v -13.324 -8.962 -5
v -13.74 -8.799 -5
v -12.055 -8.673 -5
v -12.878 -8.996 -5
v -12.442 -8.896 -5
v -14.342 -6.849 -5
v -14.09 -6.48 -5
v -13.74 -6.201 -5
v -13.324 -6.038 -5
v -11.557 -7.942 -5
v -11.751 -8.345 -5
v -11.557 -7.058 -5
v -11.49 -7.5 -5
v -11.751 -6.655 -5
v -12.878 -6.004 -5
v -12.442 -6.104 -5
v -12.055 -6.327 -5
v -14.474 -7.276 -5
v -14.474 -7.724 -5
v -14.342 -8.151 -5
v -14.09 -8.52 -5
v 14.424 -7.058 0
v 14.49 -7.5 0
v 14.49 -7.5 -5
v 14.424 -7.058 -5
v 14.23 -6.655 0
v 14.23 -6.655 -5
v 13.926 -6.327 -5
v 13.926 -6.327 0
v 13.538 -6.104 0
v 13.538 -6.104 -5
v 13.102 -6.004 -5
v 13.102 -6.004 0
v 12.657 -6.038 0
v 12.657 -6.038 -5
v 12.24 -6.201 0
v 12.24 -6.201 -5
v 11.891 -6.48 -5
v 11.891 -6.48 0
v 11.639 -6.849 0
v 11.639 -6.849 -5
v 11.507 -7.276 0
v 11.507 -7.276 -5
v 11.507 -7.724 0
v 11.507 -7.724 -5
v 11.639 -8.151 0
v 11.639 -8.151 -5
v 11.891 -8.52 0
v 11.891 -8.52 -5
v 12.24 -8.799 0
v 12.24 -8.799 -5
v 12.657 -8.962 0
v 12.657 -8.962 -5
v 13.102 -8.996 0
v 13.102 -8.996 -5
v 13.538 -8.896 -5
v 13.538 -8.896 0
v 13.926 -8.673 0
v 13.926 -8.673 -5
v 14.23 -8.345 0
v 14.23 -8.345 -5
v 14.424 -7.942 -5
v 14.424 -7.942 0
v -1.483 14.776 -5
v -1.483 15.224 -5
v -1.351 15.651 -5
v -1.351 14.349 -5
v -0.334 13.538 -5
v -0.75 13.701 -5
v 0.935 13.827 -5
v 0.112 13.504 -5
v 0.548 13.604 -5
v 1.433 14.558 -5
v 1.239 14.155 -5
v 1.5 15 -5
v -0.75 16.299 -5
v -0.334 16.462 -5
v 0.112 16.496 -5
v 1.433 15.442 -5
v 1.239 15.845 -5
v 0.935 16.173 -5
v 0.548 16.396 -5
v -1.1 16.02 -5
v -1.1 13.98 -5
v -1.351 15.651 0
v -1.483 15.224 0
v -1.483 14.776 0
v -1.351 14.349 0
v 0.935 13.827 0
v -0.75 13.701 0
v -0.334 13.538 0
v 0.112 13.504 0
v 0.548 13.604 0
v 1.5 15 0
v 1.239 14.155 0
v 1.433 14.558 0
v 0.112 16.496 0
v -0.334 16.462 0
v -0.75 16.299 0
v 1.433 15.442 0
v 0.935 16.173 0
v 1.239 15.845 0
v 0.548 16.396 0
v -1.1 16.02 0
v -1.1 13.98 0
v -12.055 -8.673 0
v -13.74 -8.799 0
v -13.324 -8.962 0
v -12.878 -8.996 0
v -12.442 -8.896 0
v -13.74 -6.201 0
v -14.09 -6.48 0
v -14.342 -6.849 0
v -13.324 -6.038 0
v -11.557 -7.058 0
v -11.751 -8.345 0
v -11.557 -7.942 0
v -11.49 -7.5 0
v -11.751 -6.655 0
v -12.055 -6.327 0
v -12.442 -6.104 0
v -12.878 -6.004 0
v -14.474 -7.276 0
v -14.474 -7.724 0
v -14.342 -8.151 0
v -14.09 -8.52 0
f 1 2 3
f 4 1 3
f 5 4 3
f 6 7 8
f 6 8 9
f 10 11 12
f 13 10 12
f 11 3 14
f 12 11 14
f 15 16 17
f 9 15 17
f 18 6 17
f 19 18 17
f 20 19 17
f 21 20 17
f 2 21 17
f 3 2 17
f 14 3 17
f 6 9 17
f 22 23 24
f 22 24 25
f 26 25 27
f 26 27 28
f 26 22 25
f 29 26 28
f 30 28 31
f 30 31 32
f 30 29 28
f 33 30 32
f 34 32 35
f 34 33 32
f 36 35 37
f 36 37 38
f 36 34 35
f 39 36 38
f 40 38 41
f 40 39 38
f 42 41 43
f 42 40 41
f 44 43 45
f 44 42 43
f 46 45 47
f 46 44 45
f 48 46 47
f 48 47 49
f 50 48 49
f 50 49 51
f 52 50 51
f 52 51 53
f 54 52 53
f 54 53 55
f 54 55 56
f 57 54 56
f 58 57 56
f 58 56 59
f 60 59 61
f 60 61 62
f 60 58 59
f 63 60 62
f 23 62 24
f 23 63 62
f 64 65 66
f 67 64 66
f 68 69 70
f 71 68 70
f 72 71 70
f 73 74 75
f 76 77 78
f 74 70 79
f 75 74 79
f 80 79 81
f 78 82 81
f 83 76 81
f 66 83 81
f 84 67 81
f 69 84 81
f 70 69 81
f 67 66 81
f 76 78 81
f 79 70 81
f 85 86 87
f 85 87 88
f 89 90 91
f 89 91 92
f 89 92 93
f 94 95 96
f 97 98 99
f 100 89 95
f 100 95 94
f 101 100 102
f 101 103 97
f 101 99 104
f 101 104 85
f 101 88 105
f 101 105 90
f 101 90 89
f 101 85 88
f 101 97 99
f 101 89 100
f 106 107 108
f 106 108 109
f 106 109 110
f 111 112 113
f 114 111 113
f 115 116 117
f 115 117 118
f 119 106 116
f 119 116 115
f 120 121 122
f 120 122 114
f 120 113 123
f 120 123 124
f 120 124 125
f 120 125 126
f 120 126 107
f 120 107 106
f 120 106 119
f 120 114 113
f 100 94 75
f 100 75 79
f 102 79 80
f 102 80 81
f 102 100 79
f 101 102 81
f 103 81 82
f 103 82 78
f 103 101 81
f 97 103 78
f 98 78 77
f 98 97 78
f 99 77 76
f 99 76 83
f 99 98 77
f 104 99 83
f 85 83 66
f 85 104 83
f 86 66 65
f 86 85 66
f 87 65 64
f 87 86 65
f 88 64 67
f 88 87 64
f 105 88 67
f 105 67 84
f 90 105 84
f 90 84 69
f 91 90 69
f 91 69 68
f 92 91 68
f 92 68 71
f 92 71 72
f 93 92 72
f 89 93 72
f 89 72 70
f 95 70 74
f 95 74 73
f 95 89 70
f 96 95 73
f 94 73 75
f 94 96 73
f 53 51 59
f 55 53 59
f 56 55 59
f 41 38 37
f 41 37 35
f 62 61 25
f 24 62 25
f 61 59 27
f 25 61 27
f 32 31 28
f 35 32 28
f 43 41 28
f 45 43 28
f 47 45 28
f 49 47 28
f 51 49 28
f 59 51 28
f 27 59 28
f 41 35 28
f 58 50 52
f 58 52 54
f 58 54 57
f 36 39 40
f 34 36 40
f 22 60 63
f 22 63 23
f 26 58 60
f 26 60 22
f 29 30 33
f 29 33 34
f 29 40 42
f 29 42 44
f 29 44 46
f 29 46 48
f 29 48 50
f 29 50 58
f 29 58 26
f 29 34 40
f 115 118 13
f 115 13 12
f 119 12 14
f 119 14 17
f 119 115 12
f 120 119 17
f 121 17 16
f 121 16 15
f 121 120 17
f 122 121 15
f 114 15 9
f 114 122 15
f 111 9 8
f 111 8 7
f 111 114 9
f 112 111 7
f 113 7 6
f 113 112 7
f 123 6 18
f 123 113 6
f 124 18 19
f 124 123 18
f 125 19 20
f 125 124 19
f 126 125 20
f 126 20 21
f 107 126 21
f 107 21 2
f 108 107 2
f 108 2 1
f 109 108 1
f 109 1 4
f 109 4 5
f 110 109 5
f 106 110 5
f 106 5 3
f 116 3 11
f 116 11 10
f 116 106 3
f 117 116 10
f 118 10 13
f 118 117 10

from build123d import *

# Parameters (mm, degrees)
SKIZZE1_R                         = 1.5
AUFSATZ_LINEAR_AUSTRAGEN1_DEPTH   = 5
AUFSATZ_LINEAR_AUSTRAGEN1_2_DEPTH = 5
AUFSATZ_LINEAR_AUSTRAGEN1_3_DEPTH = 5


with BuildPart() as part:
    # Skizze1 → Aufsatz-Linear austragen1 (new body)
    with BuildSketch(Plane.XY):
        with Locations((0, 15)):
            Circle(SKIZZE1_R)
    extrude(amount=-AUFSATZ_LINEAR_AUSTRAGEN1_DEPTH)


with BuildPart() as body_2:
    # Skizze1 → Aufsatz-Linear austragen1 2 (new body)
    with BuildSketch(Plane.XY):
        with Locations((12.990381057, -7.5)):
            Circle(SKIZZE1_R)
    extrude(amount=-AUFSATZ_LINEAR_AUSTRAGEN1_2_DEPTH)


with BuildPart() as body_3:
    # Skizze1 → Aufsatz-Linear austragen1 3 (new body)
    with BuildSketch(Plane.XY):
        with Locations((-12.990381057, -7.5)):
            Circle(SKIZZE1_R)
    extrude(amount=-AUFSATZ_LINEAR_AUSTRAGEN1_3_DEPTH)


solid = Compound([part.part, body_2.part, body_3.part])
